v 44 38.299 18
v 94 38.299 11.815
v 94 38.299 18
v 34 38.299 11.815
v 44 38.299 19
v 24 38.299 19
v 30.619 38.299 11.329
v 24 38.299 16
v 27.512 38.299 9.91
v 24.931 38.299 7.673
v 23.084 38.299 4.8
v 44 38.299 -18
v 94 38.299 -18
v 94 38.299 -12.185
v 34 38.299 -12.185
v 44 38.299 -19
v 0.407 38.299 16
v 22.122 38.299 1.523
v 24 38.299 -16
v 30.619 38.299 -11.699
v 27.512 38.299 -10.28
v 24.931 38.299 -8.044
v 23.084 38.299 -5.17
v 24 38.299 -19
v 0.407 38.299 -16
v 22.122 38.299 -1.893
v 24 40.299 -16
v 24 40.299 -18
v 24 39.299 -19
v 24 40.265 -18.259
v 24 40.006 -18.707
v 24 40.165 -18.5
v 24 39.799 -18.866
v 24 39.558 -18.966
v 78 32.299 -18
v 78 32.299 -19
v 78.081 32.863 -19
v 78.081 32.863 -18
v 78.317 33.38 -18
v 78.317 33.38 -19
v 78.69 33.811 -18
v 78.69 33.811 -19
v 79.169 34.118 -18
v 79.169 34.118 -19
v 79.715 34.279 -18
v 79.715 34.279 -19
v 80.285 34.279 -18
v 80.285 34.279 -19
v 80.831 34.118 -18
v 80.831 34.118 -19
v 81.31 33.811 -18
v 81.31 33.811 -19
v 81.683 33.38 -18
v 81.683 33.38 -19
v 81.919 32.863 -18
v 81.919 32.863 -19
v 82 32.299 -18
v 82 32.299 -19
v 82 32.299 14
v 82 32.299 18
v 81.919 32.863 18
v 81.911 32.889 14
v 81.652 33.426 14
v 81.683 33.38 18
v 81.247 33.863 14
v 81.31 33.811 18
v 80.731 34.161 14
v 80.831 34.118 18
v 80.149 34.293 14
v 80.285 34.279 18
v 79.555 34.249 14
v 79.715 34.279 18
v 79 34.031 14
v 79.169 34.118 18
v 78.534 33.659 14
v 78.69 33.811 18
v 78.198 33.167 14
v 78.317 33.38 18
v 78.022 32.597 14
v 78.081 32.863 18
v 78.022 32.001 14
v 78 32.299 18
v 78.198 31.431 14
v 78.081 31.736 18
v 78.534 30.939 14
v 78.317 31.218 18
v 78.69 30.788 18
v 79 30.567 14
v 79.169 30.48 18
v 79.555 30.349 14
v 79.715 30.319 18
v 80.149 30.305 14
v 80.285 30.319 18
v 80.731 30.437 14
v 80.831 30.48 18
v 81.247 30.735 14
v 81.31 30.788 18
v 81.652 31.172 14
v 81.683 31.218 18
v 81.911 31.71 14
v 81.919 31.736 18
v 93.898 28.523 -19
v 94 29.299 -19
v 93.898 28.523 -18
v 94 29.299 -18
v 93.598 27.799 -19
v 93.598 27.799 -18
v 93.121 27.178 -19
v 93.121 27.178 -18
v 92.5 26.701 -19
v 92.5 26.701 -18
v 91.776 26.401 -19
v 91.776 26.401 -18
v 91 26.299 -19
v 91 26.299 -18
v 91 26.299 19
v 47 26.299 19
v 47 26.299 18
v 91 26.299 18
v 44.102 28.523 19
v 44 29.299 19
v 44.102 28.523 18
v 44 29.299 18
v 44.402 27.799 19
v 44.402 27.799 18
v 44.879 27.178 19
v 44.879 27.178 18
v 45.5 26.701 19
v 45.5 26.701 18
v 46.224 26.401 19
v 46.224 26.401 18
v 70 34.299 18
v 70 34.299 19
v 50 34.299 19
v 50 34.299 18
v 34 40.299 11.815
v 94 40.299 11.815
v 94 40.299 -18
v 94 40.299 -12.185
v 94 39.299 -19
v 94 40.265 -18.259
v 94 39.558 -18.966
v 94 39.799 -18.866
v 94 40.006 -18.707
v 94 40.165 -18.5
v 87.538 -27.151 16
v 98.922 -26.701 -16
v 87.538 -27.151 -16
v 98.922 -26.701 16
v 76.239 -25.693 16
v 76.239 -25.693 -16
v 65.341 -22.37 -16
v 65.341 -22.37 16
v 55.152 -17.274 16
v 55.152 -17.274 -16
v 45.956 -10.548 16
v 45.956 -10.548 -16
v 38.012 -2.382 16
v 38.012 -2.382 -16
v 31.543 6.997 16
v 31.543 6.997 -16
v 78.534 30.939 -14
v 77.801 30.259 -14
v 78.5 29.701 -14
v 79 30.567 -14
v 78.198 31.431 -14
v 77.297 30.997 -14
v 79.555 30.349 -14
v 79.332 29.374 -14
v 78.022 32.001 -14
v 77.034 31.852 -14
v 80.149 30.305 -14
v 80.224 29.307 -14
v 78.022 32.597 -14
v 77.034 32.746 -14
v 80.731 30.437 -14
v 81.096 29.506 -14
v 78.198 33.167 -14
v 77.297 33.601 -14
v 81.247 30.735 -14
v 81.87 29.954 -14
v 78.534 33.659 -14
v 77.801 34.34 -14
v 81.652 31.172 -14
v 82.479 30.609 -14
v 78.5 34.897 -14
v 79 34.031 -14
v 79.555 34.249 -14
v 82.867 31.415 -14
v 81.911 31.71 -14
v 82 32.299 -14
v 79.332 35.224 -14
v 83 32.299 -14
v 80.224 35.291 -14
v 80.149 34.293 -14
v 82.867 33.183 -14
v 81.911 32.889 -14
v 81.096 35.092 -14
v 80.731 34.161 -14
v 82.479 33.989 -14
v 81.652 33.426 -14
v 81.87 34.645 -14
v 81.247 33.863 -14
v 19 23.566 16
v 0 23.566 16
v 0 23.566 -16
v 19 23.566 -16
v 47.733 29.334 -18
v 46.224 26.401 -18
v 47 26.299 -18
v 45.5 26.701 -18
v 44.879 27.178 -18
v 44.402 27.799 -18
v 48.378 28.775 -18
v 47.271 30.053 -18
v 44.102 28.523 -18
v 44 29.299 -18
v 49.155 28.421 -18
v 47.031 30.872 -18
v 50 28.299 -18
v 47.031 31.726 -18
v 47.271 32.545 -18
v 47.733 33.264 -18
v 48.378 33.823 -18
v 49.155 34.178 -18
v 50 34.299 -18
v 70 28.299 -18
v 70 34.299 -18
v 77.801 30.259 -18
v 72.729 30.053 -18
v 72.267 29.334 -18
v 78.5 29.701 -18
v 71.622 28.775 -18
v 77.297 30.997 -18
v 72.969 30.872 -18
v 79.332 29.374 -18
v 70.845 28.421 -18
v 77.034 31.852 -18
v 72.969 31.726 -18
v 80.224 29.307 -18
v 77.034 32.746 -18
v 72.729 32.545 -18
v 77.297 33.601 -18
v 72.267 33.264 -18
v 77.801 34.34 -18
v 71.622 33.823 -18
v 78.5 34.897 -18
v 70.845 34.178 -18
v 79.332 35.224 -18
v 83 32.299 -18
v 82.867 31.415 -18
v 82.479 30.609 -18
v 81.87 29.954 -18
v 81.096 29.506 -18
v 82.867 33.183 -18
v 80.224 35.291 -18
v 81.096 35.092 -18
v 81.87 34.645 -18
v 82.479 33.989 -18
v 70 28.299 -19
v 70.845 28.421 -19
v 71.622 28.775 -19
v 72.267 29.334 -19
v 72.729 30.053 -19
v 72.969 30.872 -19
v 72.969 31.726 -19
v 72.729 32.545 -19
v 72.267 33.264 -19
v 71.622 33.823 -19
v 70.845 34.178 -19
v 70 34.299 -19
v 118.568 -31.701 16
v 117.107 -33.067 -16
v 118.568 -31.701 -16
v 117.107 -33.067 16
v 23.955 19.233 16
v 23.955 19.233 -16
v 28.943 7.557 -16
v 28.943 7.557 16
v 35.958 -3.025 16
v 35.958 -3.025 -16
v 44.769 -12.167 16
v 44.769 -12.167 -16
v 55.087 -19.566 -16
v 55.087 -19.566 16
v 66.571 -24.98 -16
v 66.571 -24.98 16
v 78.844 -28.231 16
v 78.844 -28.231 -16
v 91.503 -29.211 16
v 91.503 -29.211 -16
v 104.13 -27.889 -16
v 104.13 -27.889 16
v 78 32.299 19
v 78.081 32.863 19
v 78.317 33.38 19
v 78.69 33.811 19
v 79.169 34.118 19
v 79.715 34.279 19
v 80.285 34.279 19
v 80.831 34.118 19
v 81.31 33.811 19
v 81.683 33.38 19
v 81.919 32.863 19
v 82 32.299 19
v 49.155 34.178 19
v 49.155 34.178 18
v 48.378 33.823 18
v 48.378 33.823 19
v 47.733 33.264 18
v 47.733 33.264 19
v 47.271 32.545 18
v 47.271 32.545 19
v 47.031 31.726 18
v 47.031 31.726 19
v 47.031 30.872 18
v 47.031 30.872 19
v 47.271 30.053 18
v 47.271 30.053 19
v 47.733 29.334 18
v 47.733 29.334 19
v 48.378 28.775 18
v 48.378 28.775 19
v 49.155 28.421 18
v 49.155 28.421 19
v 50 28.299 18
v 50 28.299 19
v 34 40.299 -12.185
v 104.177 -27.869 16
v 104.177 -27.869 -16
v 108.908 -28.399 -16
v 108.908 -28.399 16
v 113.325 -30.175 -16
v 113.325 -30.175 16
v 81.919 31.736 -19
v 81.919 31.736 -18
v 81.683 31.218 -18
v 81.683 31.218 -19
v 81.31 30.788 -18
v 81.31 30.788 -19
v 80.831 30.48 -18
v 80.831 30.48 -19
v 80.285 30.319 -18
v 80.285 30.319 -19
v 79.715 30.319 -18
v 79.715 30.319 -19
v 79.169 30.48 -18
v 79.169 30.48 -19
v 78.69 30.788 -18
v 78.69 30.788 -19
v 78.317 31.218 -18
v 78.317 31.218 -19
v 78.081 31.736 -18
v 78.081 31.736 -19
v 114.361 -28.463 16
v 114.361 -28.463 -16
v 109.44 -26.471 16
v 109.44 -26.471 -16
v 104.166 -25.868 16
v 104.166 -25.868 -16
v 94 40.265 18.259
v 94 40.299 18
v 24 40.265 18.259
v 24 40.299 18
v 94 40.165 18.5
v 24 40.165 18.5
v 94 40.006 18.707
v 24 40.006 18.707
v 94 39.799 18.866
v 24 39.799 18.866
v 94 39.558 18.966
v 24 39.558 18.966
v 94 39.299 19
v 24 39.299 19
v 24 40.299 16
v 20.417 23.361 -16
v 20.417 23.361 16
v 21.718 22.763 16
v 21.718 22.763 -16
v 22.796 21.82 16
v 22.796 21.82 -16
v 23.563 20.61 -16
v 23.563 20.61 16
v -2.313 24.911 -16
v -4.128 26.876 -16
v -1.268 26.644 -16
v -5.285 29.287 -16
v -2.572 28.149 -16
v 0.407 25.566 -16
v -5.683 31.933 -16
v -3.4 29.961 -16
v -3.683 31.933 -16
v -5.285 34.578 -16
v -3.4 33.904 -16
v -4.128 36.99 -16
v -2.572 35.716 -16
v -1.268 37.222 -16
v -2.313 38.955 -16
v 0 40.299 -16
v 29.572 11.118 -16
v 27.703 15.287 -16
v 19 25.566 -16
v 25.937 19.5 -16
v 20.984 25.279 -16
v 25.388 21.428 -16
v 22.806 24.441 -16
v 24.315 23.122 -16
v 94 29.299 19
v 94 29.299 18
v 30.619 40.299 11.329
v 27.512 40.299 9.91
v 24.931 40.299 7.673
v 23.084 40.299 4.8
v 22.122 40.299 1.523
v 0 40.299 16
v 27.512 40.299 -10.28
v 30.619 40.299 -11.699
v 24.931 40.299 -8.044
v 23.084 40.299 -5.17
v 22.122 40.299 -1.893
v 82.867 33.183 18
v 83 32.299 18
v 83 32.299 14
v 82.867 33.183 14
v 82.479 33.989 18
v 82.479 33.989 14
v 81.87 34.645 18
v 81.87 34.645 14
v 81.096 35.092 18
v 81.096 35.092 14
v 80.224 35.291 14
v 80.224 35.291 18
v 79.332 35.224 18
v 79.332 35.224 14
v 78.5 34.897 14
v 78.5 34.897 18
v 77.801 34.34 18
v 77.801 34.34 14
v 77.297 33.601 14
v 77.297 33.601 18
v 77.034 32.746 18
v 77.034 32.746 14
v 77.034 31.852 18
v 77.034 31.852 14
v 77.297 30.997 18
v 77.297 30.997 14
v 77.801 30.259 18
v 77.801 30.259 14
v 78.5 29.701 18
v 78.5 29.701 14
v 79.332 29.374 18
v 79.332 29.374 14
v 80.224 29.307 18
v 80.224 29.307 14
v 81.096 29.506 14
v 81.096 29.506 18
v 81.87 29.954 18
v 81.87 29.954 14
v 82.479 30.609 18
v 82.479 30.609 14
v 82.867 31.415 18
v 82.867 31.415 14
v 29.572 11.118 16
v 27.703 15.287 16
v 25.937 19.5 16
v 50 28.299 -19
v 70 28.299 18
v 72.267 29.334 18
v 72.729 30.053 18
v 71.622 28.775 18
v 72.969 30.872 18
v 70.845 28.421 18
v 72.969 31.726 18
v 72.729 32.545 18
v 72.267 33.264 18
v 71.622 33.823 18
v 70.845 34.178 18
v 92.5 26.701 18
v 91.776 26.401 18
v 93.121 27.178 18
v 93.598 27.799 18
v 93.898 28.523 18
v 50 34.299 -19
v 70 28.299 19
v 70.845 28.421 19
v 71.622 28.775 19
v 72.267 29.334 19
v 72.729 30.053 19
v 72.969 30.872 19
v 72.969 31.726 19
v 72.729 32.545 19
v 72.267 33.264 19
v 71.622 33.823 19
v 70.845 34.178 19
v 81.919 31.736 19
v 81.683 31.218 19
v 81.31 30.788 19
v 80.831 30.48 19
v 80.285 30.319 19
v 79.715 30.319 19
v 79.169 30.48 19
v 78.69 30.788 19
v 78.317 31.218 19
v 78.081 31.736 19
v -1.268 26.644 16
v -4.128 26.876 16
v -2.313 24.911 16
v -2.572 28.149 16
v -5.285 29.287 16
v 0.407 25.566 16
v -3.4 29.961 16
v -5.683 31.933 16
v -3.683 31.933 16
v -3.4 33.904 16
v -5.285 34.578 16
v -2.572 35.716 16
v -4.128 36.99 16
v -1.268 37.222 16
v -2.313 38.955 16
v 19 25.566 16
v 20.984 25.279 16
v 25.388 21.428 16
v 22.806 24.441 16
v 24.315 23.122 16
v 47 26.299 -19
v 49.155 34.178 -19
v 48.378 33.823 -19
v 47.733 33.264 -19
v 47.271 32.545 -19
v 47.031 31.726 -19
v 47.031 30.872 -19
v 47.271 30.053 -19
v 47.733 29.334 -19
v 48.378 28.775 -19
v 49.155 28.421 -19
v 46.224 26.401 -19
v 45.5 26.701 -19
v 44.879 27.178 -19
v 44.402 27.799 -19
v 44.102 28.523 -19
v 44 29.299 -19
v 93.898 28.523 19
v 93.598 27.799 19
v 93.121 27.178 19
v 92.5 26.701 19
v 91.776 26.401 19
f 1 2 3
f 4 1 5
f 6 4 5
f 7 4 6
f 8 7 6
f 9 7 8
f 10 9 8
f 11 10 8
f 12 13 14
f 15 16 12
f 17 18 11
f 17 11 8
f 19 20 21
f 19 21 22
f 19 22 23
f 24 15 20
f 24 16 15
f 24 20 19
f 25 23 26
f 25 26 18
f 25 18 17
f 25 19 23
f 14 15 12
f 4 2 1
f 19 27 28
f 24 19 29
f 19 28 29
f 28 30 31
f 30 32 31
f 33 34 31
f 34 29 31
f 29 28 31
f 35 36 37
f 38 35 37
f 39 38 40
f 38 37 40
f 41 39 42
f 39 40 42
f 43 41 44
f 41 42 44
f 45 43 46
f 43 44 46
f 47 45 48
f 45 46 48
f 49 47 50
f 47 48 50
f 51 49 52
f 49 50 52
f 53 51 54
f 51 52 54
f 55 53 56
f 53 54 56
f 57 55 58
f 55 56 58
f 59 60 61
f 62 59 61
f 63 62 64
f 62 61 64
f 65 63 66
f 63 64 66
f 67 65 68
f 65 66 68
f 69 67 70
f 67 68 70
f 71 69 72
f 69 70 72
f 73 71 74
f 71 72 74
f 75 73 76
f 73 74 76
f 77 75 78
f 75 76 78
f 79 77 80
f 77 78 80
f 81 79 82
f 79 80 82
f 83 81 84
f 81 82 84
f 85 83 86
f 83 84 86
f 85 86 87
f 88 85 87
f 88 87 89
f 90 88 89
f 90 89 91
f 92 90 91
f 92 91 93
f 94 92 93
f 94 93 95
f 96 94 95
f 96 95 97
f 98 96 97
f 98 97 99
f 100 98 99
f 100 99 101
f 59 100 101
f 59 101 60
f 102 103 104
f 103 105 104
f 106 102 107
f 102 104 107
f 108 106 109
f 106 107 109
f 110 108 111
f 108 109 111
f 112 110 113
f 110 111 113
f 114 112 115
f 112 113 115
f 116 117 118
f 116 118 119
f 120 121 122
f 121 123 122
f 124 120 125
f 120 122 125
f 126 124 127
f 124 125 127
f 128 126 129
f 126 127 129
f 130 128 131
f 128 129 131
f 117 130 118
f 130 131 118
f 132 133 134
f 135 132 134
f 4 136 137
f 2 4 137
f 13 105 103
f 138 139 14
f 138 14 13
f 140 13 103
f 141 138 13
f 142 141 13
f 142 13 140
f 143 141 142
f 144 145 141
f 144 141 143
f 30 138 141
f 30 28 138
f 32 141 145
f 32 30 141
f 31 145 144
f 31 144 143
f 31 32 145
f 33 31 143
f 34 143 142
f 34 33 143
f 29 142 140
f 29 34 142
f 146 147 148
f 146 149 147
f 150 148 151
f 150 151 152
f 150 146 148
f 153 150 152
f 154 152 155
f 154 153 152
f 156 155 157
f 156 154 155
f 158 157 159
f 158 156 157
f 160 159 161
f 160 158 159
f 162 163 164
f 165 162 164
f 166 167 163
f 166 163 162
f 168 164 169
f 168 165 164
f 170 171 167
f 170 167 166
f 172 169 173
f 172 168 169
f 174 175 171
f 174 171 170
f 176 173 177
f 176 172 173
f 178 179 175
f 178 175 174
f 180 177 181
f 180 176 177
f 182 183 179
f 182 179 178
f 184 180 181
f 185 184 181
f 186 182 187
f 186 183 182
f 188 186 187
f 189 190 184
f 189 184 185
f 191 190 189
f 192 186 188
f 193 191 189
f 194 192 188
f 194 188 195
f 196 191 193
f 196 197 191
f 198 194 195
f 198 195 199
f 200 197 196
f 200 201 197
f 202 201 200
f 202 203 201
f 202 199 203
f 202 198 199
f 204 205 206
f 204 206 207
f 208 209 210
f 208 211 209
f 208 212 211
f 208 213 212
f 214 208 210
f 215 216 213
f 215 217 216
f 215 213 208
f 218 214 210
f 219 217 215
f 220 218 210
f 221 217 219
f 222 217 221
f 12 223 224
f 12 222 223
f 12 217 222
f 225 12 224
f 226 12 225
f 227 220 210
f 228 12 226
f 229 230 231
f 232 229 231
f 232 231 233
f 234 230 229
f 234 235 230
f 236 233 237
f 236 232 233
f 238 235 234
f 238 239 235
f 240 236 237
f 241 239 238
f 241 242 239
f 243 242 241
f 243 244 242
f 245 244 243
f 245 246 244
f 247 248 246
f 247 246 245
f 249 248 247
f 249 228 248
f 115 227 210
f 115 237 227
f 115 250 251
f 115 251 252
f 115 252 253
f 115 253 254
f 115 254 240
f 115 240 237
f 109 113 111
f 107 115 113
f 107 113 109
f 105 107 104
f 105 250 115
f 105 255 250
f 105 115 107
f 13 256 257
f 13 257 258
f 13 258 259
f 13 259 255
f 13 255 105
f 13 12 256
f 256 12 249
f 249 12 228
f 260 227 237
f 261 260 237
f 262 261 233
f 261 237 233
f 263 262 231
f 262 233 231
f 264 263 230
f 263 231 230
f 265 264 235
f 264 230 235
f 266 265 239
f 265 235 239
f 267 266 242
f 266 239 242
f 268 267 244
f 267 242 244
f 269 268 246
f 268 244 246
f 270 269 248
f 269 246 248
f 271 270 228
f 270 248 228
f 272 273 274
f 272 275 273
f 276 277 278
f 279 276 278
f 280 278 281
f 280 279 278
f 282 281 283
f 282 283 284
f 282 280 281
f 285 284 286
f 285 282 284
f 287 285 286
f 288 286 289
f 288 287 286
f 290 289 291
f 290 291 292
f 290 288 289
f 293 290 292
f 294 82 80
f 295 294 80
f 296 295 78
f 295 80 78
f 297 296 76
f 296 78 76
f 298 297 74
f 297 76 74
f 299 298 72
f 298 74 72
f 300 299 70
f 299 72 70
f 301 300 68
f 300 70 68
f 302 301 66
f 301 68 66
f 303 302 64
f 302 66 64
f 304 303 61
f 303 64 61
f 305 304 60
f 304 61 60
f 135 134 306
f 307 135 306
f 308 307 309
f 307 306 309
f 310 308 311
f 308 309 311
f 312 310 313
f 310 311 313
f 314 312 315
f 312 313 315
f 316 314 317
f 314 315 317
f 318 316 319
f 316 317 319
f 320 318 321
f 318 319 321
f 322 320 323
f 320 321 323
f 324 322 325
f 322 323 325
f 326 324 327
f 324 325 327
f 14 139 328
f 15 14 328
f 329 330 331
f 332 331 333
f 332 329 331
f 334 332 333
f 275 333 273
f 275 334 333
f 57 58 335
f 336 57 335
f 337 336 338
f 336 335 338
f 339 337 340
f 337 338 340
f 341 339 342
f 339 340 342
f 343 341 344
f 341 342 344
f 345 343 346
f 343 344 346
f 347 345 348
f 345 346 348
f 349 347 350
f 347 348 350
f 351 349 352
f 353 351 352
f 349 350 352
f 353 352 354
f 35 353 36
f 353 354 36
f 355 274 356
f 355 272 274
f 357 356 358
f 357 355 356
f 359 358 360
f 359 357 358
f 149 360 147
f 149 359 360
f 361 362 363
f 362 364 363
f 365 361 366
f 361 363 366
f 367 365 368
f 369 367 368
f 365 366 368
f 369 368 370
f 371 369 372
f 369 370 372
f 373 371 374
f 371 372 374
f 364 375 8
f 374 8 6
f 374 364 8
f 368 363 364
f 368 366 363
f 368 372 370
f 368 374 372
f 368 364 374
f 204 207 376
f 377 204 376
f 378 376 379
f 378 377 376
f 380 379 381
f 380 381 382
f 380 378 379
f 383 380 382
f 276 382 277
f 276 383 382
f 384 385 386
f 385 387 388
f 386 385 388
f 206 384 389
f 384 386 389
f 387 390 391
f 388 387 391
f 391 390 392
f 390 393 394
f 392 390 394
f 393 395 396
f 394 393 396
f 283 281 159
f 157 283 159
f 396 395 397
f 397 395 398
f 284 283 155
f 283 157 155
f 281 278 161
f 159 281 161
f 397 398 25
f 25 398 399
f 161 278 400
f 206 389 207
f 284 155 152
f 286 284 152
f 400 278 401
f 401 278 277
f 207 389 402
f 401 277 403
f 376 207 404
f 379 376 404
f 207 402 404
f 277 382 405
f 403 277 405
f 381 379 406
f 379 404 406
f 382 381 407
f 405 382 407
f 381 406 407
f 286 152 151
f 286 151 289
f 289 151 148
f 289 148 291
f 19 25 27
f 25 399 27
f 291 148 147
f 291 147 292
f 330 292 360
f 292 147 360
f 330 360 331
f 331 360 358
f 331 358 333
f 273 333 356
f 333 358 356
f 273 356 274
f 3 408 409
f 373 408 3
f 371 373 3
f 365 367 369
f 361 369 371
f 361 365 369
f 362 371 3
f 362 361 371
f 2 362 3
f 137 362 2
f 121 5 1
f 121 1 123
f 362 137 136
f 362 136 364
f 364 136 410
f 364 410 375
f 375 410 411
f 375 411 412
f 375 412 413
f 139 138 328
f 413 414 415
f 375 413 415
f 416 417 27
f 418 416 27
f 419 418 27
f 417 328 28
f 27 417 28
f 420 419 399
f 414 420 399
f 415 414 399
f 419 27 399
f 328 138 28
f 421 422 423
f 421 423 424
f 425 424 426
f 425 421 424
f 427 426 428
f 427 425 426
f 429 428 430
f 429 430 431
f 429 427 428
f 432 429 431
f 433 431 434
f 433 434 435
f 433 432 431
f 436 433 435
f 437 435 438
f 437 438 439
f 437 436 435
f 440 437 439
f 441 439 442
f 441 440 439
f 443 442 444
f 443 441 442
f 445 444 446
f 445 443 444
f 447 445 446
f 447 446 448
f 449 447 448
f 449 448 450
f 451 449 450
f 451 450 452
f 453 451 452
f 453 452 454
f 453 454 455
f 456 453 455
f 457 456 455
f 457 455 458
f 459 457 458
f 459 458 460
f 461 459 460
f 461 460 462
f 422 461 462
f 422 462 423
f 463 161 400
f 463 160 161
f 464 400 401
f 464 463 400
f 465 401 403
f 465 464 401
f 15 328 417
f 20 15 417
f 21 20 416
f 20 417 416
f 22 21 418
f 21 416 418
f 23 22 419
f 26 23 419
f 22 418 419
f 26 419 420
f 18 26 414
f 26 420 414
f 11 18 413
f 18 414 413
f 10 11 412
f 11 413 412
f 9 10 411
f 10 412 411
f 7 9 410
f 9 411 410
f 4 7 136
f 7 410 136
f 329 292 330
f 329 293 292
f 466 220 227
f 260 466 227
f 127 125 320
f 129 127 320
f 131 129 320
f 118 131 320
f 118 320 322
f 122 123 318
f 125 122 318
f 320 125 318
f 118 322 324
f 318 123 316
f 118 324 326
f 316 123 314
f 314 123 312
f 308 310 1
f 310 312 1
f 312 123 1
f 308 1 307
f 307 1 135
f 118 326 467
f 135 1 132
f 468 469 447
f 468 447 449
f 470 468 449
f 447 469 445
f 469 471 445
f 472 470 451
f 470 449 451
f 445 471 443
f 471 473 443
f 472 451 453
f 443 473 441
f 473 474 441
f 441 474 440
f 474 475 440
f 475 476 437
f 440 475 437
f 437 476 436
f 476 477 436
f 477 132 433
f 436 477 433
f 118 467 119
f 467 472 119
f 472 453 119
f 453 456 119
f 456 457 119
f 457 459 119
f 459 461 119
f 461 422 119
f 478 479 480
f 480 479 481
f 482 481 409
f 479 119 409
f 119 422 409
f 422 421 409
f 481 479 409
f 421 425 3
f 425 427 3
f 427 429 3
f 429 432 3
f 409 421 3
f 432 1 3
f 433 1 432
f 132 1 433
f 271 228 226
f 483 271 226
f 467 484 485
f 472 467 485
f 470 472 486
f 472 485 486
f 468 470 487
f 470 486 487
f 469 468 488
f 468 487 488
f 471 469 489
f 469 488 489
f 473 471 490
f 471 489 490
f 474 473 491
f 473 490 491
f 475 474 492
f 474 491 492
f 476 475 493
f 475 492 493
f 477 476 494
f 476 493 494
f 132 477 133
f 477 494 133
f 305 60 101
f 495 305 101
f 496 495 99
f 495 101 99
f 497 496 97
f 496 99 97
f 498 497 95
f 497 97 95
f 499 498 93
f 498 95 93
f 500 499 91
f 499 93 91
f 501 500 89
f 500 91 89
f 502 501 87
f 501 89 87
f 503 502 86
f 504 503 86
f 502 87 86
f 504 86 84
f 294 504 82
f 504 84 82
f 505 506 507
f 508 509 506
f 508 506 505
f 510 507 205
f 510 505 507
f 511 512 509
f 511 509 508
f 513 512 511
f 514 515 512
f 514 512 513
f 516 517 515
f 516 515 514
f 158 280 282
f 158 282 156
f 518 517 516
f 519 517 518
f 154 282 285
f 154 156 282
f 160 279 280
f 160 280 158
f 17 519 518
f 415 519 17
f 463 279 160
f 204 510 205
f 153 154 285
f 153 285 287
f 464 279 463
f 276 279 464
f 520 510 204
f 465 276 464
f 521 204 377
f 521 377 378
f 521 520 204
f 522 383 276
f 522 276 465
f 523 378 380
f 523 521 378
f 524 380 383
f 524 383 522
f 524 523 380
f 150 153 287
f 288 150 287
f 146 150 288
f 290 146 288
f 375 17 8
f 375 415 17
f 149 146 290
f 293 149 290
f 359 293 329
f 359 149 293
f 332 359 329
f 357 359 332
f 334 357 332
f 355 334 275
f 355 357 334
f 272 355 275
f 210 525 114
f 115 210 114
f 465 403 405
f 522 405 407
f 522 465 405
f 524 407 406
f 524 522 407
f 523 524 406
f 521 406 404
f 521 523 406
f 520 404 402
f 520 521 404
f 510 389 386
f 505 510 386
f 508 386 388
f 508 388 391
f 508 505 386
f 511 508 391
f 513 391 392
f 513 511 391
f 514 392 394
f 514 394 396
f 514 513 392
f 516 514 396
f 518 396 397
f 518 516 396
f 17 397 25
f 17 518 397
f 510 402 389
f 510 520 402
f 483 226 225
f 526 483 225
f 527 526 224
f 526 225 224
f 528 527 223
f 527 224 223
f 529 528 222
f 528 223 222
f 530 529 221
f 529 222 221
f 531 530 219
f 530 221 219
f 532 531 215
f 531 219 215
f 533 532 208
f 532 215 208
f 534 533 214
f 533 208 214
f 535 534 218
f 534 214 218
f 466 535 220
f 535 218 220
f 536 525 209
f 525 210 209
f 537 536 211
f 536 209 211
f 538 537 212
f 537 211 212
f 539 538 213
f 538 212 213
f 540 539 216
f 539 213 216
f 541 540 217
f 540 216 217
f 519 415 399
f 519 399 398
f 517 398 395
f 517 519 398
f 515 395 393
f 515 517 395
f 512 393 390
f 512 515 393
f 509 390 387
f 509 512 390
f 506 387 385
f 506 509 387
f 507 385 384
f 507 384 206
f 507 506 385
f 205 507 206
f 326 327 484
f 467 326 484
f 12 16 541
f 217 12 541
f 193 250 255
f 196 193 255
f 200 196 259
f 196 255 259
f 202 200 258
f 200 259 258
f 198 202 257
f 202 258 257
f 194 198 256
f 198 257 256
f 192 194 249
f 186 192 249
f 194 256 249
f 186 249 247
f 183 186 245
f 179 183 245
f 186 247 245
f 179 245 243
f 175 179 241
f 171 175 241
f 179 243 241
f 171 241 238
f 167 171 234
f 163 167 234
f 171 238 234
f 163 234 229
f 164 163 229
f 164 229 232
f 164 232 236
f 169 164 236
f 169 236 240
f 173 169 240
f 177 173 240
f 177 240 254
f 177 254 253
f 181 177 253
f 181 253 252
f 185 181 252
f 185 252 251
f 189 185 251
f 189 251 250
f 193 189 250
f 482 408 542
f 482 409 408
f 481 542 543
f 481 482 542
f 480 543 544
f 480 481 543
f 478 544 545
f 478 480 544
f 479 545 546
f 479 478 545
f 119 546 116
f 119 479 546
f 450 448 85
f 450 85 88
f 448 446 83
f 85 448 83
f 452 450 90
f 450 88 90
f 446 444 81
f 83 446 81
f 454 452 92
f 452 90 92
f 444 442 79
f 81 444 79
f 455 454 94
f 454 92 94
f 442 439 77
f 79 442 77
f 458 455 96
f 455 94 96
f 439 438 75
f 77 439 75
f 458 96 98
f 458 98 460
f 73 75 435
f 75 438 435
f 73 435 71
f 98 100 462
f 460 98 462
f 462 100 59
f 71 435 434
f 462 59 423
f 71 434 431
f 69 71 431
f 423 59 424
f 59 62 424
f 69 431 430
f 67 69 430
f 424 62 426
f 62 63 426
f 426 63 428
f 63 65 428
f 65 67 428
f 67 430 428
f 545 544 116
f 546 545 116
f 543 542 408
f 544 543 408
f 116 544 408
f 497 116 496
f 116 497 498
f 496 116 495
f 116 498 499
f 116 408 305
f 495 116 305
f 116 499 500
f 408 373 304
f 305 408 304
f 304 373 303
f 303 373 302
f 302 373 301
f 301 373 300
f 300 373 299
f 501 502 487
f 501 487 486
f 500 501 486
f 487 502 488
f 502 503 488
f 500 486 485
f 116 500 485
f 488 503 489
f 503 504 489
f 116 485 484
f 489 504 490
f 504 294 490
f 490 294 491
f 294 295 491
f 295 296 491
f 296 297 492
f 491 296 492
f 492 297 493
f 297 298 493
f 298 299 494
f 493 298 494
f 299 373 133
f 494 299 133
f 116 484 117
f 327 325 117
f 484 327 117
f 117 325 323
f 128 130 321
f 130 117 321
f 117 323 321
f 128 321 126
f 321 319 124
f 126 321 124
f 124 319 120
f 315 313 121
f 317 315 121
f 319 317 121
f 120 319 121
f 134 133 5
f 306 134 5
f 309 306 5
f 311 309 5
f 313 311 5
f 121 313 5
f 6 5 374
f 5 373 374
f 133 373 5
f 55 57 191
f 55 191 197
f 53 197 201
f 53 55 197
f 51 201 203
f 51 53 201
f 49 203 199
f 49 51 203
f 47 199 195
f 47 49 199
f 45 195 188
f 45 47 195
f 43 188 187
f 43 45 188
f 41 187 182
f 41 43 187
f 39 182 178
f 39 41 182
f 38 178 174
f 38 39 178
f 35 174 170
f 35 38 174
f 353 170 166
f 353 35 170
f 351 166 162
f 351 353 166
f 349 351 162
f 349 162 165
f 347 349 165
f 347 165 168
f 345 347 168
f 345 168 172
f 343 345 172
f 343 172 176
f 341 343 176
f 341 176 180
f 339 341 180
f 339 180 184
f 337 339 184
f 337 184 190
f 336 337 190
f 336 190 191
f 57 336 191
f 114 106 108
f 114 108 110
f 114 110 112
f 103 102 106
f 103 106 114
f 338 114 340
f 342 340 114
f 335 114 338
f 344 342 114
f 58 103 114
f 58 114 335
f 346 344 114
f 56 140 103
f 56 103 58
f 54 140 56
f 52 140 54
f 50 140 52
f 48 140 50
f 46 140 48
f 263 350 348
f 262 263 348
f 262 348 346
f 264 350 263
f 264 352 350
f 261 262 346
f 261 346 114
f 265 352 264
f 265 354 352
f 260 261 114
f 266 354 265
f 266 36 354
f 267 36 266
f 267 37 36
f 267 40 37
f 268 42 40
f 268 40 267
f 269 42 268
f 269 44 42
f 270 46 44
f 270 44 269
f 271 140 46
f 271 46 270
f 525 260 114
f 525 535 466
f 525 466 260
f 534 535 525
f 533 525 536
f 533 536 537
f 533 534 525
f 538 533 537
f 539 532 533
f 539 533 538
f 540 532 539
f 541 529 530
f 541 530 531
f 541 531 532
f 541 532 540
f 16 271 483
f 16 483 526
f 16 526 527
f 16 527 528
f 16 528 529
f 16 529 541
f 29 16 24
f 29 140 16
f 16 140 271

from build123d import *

# Parameters (mm, degrees)
F1_DEPTH  = 16
F2_W      = 70
F2_H      = 3
F3_DEPTH  = 2
F4_W      = 50
F4_H      = 2
F4_H_2    = 12
F5_DEPTH  = 1
F6_R      = 1
F9_DEPTH  = 2
F11_DEPTH = 38.001
F13_D     = 4
F13_DEPTH = 50
F13_TIP   = 1.2017212381
F14_R     = 3
F14_R_2   = 2
F15_DEPTH = 5
F16_R     = 3


# Not quite as in the source:
# - a pattern or mirror of a feature is missing from the dataset's text; its kind, count and spacing are read off the source's solid


with BuildPart() as f1:
    # F0 (on Top) → F1 (new body)
    with BuildSketch(Plane.XY):
        with BuildLine():
            Line((94, 38.2990682213), (94, 40.2990682213))
            Line((94, 40.2990682213), (0, 40.2990682213))
            ThreePointArc((0, 40.2990682213), (-5.6829599791, 31.9326325705), (0, 23.5661969196))
            Line((0, 23.5661969196), (19, 23.5661969196))
            ThreePointArc((19, 23.5661969196), (22.2913263859, 22.330127129), (23.9553291252, 19.2330651681))
            ThreePointArc((23.9553291252, 19.2330651681), (55.0865893222, -19.5660123964), (104.1299821488, -27.8888365183))
            Line((104.1299821488, -27.8888365183), (104.1769053316, -27.8687567031))
            ThreePointArc((104.1769053316, -27.8687567031), (111.1768871923, -29.1372905243), (117.1067956471, -33.0673172193))
            Line((117.1067956471, -33.0673172193), (118.5684373125, -31.7009317787))
            ThreePointArc((118.5684373125, -31.7009317787), (109.440201014, -26.4706046683), (98.9222178887, -26.7009317787))
            ThreePointArc((98.9222178887, -26.7009317787), (60.1395132052, -20.0357341509), (31.5428701215, 6.9967471693))
            ThreePointArc((31.5428701215, 6.9967471693), (28.6246292953, 13.1964823258), (25.9374607753, 19.4998124675))
            ThreePointArc((25.9374607753, 19.4998124675), (23.6078569403, 23.8356992128), (19, 25.5661969196))
            Line((19, 25.5661969196), (0.4069717908, 25.5661969196))
            ThreePointArc((0.4069717908, 25.5661969196), (-3.6829599791, 31.9326325705), (0.4069717908, 38.2990682213))
            Line((0.4069717908, 38.2990682213), (94, 38.2990682213))
        make_face()
    extrude(amount=F1_DEPTH)

    # F2 (on face) → F3 (join)
    with BuildSketch(Plane(origin=(0, 40.2990682213, 0), x_dir=(-1, 0, 0), z_dir=(0, 1, 0))):
        with Locations((-59, 17.5)):
            Rectangle(F2_W, F2_H)
    extrude(amount=-F3_DEPTH)

    # F4 (on face) → F5 (join)
    with BuildSketch(Plane.XY.offset(19)):
        with Locations((69, 39.2990682213)):
            Rectangle(F4_W, F4_H)
        with Locations((69, 32.2990682213)):
            Rectangle(F4_W, F4_H_2)
    extrude(amount=-F5_DEPTH)

    # F6
    f6_edges = [f1.edges().sort_by_distance(p)[0] for p in [
        (59, 40.299068, 19),
    ]]
    fillet(f6_edges, radius=F6_R)

    # F7: F1 across face


with BuildPart() as f1_1:
    add(f1.part)
    add(f1.part.mirror(Plane(origin=(48.2414959272, 12.2129217621, 0), x_dir=(1, 0, 0), z_dir=(0, 0, -1))))

    # F8 (on face) → F9 (cut)
    with BuildSketch(Plane(origin=(0, 40.2990682213, 0), x_dir=(-1, 0, 0), z_dir=(0, 1, 0))):
        with BuildLine():
            Line((-34, 11.8147813603), (-94, 11.8147813603))
            Line((-94, 11.8147813603), (-94, -12.1852186397))
            Line((-94, -12.1852186397), (-34, -12.1852186397))
            ThreePointArc((-34, -12.1852186397), (-22, -0.1852186397), (-34, 11.8147813603))
        make_face()
    extrude(amount=-F9_DEPTH, mode=Mode.SUBTRACT)

    # F10 (on face) → F11 (cut, through all)
    with BuildSketch(Plane.XY.offset(19)):
        with BuildLine():
            ThreePointArc((50, 34.2990682213), (47, 31.2990682213), (50, 28.2990682213))
            Line((50, 28.2990682213), (70, 28.2990682213))
            ThreePointArc((70, 28.2990682213), (73, 31.2990682213), (70, 34.2990682213))
            Line((70, 34.2990682213), (50, 34.2990682213))
        make_face()
    extrude(amount=-F11_DEPTH, mode=Mode.SUBTRACT)

    # F13
    with Locations(Plane.XY.offset(19)):
        with Locations((80, 32.2990682213)):
            Hole(F13_D / 2, depth=F13_DEPTH)
            with Locations((0, 0, -(F13_DEPTH + F13_TIP / 2))):  # 118° drill point
                Cone(0, F13_D / 2, F13_TIP, mode=Mode.SUBTRACT)

    # F14 (on face) → F15 (join)
    with BuildSketch(Plane.XY.offset(19)):
        with Locations((80, 32.2990682213)):
            Circle(F14_R)
        with Locations((80, 32.2990682213)):
            Circle(F14_R_2, mode=Mode.SUBTRACT)
    f15 = extrude(amount=-F15_DEPTH)

    # F15_copies: F15 across plane
    add(f15.mirror(Plane(origin=(0, 0, 0), x_dir=(-1, 0, 0), z_dir=(0, 0, -1))))

    # F16
    f16_edges = [f1_1.edges().sort_by_distance(p)[0] for p in [
        (44, 26.299068, 18.5),
        (44, 26.299068, -18.5),
        (94, 26.299068, -18.5),
        (94, 26.299068, 18.5),
    ]]
    fillet(f16_edges, radius=F16_R)


solid = f1_1.part
